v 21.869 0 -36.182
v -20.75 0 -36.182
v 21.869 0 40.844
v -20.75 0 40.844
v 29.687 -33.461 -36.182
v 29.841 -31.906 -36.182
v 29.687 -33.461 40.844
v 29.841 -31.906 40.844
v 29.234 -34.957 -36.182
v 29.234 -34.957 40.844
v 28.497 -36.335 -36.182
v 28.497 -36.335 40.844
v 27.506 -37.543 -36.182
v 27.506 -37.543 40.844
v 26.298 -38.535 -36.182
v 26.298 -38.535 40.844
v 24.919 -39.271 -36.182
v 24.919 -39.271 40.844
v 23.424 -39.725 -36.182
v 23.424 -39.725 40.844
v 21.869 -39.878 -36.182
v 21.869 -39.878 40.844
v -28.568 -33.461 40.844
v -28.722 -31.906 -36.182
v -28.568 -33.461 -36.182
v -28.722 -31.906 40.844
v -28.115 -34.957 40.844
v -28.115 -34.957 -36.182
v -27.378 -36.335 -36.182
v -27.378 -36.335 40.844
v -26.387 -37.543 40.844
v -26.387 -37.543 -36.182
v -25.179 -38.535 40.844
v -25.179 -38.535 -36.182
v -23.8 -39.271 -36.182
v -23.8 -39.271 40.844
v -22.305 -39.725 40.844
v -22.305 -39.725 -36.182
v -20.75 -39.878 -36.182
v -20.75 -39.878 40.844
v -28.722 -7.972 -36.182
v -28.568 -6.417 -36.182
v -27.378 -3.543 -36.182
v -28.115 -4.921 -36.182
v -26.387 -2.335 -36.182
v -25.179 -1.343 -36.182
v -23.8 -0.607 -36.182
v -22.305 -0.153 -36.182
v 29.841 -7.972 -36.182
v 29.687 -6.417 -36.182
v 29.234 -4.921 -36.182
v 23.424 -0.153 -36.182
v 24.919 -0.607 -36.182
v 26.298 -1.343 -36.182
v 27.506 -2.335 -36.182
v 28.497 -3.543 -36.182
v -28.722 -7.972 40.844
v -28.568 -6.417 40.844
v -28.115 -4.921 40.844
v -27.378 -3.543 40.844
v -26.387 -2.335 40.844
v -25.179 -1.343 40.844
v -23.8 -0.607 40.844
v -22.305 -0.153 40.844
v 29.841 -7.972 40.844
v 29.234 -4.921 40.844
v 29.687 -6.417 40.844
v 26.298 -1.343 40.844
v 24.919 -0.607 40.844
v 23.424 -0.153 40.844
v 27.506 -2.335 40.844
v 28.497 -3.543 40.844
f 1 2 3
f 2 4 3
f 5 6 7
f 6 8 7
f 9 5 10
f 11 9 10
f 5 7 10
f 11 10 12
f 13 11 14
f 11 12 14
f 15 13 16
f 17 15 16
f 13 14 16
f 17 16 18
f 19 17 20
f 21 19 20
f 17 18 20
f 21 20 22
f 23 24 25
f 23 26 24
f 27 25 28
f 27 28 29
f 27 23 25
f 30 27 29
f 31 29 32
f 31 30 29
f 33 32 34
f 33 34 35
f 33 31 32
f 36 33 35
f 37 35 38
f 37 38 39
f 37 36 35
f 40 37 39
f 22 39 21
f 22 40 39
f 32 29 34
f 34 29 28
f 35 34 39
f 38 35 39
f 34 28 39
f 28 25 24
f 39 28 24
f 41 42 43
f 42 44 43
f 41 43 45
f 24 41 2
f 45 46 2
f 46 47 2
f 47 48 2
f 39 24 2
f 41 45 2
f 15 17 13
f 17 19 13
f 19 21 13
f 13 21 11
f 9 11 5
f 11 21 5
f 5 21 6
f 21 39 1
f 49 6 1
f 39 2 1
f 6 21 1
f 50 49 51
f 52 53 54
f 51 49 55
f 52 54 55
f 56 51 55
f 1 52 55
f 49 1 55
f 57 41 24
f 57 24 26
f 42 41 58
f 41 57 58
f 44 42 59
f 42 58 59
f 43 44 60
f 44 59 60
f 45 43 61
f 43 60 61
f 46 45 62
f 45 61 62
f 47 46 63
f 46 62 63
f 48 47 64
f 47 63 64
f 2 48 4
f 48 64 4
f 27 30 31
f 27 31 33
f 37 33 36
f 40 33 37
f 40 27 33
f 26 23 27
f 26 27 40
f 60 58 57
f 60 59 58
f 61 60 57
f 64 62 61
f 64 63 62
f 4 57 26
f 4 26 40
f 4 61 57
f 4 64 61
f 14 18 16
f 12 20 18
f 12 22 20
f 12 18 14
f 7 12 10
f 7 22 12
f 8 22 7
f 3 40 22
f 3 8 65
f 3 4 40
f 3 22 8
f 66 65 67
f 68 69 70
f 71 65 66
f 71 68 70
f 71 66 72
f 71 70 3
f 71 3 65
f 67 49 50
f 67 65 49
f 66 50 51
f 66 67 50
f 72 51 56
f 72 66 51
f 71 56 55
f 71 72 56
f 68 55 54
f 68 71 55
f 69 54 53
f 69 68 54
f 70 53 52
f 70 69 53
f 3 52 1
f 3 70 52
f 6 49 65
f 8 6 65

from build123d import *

# Parameters (mm, degrees)
F0_W     = 58.5621017963
F0_H     = 77.0259462297
F1_DEPTH = 39.878
F2_R     = 7.971733183
F3_R     = 6.2062238441
F6_DEPTH = 0.762


# Not quite as in the source:
# - the program builds the solid bodies; features that only make, move or delete a surface that nothing else refers to are left out


with BuildPart() as f1:
    # F0 (on Front) → F1 (new body)
    with BuildSketch(Plane.XZ):
        with Locations((0.5595115945, 2.331295982)):
            Rectangle(F0_W, F0_H)
    extrude(amount=F1_DEPTH)

    # F2
    f2_edges = [f1.edges().sort_by_distance(p)[0] for p in [
        (29.840562, -39.878, 2.331296),
        (-28.721539, -39.878, 2.331296),
        (29.840562, 0, 2.331296),
        (-28.721539, 0, 2.331296),
    ]]
    fillet(f2_edges, radius=F2_R)

    # F3 (on face) → F6 (join)
    with BuildSketch(Plane.XY.offset(40.8442690969)):
        with BuildLine():
            Line((15.5188293097, -6.3193492971), (-17.34697557, -6.3193492971))
            ThreePointArc((-17.34697557, -6.3193492971), (-21.8371036305, -8.1792212365), (-23.69697557, -12.6693492971))
            Line((-23.69697557, -12.6693492971), (-23.69697557, -25.556266817))
            ThreePointArc((-23.69697557, -25.556266817), (-21.8371036305, -30.0463948776), (-17.34697557, -31.906266817))
            Line((-17.34697557, -31.906266817), (15.5188293097, -31.906266817))
            ThreePointArc((15.5188293097, -31.906266817), (20.0089573702, -30.0463948776), (21.8688293097, -25.556266817))
            Line((21.8688293097, -25.556266817), (21.8688293097, -12.6693492971))
            ThreePointArc((21.8688293097, -12.6693492971), (20.0089573702, -8.1792212365), (15.5188293097, -6.3193492971))
        make_face()
        Polygon((-8.0732123646, -19.3963646889), (-10.657480345, -23.8724481314), (-15.826016306, -23.8724481314), (-18.4102842865, -19.3963646889), (-15.826016306, -14.9202812463), (-10.657480345, -14.9202812463), align=None, mode=Mode.SUBTRACT)
        with Locations((8.9521687478, -19.2098617554)):
            Circle(F3_R, mode=Mode.SUBTRACT)
    extrude(amount=-F6_DEPTH)


solid = f1.part
